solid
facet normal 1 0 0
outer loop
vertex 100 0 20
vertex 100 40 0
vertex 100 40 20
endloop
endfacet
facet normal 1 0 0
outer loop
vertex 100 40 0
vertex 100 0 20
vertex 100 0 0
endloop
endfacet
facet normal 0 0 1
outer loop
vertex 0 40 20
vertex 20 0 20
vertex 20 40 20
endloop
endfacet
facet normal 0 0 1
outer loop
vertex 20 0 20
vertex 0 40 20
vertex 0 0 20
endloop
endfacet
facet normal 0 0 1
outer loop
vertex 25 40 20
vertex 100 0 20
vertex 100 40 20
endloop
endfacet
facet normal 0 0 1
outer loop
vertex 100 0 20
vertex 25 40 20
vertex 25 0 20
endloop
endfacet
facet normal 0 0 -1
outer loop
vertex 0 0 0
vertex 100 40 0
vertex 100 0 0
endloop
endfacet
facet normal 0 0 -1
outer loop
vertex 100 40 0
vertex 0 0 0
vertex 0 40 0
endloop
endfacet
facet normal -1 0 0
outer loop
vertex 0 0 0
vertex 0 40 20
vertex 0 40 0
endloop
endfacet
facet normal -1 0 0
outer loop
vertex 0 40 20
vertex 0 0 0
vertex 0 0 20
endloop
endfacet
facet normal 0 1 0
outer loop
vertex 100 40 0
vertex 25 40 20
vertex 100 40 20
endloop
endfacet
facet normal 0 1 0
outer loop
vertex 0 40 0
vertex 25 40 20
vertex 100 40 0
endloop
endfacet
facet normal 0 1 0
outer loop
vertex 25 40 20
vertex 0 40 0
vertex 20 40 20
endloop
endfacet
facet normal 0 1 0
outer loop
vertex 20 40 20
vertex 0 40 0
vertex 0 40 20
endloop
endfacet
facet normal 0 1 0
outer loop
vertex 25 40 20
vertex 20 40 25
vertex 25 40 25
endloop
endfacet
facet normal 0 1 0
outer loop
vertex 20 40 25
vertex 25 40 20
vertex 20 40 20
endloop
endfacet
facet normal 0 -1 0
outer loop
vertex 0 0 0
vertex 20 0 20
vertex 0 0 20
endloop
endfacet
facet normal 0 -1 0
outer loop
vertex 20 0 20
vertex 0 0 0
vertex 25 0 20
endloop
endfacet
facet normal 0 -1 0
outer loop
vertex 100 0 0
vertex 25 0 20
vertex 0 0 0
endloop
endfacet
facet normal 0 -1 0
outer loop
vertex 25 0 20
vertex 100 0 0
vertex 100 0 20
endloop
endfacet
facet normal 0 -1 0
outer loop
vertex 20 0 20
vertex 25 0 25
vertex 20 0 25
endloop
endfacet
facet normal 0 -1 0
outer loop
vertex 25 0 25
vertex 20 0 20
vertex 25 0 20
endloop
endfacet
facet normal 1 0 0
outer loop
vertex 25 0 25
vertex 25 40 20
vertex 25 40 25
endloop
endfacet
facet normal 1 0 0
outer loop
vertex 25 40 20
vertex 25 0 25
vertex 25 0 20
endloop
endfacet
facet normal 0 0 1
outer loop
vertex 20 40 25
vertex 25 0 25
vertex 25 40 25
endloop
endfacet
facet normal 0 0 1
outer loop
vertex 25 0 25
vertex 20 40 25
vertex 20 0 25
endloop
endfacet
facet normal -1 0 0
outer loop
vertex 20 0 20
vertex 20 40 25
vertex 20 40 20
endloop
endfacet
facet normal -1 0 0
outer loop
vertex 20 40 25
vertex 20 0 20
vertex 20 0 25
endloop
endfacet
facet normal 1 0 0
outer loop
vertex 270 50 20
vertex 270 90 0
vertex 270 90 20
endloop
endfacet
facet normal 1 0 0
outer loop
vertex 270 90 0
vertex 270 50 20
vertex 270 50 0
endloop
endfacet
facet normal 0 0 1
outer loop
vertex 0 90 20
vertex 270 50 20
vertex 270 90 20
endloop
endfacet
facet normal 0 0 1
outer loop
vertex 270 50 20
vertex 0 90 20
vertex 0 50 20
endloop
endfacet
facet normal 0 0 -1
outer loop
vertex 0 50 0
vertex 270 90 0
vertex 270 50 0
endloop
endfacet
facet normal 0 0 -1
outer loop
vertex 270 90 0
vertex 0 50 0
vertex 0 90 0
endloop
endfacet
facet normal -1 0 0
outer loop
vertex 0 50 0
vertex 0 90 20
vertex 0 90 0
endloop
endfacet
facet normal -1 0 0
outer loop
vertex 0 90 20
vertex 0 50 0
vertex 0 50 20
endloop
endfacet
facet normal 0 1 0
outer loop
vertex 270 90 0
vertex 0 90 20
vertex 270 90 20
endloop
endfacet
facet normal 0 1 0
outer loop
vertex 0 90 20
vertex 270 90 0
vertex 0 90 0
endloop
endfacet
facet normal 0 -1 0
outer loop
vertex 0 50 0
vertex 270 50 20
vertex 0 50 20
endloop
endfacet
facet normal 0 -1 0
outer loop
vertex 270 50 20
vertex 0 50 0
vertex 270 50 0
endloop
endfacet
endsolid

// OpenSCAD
translate([0,50,0])
  cube ([270,40,20]);
union() {
  cube([100,40,20]);
  translate([20,0,0])
    cube([5,40,25]);
}
